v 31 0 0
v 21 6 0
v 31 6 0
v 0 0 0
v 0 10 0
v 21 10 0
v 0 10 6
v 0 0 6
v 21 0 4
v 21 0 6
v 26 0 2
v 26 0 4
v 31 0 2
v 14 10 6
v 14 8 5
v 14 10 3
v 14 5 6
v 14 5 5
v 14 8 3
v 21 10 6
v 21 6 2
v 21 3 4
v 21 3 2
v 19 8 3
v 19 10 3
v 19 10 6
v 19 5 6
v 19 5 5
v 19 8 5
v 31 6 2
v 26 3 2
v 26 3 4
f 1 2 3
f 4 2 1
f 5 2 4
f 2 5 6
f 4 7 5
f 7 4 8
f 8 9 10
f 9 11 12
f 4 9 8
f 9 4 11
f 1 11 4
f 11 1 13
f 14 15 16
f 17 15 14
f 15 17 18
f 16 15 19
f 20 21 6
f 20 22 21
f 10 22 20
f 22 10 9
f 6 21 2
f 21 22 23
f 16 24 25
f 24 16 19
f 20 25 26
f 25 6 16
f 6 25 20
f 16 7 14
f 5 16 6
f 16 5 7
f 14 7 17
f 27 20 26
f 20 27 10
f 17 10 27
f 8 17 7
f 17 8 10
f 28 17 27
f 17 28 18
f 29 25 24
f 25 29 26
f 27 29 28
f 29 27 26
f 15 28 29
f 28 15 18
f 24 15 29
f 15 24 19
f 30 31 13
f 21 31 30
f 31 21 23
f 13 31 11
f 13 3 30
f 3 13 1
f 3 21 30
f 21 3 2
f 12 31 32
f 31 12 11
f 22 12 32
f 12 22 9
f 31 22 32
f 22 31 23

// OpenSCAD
translate([3.5, 2.5, 1.5]) color([0.6781787462359636, 0.7600898367234922, 0.23236272144124515]) cube([7, 5, 3], center=true);
translate([10.5, 2.5, 1.5]) color([0.7619950130977117, 0.28008838468838926, 0.9840151371182455]) cube([7, 5, 3], center=true);
translate([17.5, 2.5, 1.5]) color([0.12083161078451865, 0.8837180187440564, 0.040547125043371324]) cube([7, 5, 3], center=true);
translate([3.5, 7.5, 1.5]) color([0.256575818348144, 0.5261019087624684, 0.5816161834445946]) cube([7, 5, 3], center=true);
translate([10.5, 7.5, 1.5]) color([0.3962349850280922, 0.10203172822707107, 0.2526080858247133]) cube([7, 5, 3], center=true);
translate([17.5, 7.5, 1.5]) color([0.28339650386048865, 0.7552228545587315, 0.9087743252220071]) cube([7, 5, 3], center=true);
translate([3.5, 2.5, 4.5]) color([0.5954099154864194, 0.03545096569102746, 0.7922364716417103]) cube([7, 5, 3], center=true);
translate([10.5, 2.5, 4.5]) color([0.30560393283991993, 0.33989040641624346, 0.5301854376454147]) cube([7, 5, 3], center=true);
translate([17.5, 2.5, 4.5]) color([0.24904704757555507, 0.9199780878573697, 0.1635547583408129]) cube([7, 5, 3], center=true);
translate([3.5, 7.5, 4.5]) color([0.41483040050373277, 0.2896919495072058, 0.5198341022016146]) cube([7, 5, 3], center=true);
translate([10.5, 7.5, 4.5]) color([0.5739818030823766, 0.6271396891048426, 0.5313758038379728]) cube([7, 5, 3], center=true);
translate([16.5, 6.5, 4.0]) color([0.4108045023355995, 0.634594012376466, 0.40341287658681757]) cube([5, 3, 2], center=true);
translate([20.0, 7.5, 4.5]) color([0.7785502590540477, 0.7881774252549901, 0.29225416811082217]) cube([2, 5, 3], center=true);
translate([23.5, 1.5, 1.0]) color([0.37180432355577453, 0.6288109059468862, 0.15706996711565713]) cube([5, 3, 2], center=true);
translate([28.5, 1.5, 1.0]) color([0.6970319309869248, 0.3814277529807131, 0.591062474757007]) cube([5, 3, 2], center=true);
translate([23.5, 4.5, 1.0]) color([0.1395330992312218, 0.6682583860975598, 0.3540578606136997]) cube([5, 3, 2], center=true);
translate([28.5, 4.5, 1.0]) color([0.4726655762072315, 0.4151074008495357, 0.47671524799509457]) cube([5, 3, 2], center=true);
translate([23.5, 1.5, 3.0]) color([0.6946956329164442, 0.31824017683207795, 0.6520544808985483]) cube([5, 3, 2], center=true);
